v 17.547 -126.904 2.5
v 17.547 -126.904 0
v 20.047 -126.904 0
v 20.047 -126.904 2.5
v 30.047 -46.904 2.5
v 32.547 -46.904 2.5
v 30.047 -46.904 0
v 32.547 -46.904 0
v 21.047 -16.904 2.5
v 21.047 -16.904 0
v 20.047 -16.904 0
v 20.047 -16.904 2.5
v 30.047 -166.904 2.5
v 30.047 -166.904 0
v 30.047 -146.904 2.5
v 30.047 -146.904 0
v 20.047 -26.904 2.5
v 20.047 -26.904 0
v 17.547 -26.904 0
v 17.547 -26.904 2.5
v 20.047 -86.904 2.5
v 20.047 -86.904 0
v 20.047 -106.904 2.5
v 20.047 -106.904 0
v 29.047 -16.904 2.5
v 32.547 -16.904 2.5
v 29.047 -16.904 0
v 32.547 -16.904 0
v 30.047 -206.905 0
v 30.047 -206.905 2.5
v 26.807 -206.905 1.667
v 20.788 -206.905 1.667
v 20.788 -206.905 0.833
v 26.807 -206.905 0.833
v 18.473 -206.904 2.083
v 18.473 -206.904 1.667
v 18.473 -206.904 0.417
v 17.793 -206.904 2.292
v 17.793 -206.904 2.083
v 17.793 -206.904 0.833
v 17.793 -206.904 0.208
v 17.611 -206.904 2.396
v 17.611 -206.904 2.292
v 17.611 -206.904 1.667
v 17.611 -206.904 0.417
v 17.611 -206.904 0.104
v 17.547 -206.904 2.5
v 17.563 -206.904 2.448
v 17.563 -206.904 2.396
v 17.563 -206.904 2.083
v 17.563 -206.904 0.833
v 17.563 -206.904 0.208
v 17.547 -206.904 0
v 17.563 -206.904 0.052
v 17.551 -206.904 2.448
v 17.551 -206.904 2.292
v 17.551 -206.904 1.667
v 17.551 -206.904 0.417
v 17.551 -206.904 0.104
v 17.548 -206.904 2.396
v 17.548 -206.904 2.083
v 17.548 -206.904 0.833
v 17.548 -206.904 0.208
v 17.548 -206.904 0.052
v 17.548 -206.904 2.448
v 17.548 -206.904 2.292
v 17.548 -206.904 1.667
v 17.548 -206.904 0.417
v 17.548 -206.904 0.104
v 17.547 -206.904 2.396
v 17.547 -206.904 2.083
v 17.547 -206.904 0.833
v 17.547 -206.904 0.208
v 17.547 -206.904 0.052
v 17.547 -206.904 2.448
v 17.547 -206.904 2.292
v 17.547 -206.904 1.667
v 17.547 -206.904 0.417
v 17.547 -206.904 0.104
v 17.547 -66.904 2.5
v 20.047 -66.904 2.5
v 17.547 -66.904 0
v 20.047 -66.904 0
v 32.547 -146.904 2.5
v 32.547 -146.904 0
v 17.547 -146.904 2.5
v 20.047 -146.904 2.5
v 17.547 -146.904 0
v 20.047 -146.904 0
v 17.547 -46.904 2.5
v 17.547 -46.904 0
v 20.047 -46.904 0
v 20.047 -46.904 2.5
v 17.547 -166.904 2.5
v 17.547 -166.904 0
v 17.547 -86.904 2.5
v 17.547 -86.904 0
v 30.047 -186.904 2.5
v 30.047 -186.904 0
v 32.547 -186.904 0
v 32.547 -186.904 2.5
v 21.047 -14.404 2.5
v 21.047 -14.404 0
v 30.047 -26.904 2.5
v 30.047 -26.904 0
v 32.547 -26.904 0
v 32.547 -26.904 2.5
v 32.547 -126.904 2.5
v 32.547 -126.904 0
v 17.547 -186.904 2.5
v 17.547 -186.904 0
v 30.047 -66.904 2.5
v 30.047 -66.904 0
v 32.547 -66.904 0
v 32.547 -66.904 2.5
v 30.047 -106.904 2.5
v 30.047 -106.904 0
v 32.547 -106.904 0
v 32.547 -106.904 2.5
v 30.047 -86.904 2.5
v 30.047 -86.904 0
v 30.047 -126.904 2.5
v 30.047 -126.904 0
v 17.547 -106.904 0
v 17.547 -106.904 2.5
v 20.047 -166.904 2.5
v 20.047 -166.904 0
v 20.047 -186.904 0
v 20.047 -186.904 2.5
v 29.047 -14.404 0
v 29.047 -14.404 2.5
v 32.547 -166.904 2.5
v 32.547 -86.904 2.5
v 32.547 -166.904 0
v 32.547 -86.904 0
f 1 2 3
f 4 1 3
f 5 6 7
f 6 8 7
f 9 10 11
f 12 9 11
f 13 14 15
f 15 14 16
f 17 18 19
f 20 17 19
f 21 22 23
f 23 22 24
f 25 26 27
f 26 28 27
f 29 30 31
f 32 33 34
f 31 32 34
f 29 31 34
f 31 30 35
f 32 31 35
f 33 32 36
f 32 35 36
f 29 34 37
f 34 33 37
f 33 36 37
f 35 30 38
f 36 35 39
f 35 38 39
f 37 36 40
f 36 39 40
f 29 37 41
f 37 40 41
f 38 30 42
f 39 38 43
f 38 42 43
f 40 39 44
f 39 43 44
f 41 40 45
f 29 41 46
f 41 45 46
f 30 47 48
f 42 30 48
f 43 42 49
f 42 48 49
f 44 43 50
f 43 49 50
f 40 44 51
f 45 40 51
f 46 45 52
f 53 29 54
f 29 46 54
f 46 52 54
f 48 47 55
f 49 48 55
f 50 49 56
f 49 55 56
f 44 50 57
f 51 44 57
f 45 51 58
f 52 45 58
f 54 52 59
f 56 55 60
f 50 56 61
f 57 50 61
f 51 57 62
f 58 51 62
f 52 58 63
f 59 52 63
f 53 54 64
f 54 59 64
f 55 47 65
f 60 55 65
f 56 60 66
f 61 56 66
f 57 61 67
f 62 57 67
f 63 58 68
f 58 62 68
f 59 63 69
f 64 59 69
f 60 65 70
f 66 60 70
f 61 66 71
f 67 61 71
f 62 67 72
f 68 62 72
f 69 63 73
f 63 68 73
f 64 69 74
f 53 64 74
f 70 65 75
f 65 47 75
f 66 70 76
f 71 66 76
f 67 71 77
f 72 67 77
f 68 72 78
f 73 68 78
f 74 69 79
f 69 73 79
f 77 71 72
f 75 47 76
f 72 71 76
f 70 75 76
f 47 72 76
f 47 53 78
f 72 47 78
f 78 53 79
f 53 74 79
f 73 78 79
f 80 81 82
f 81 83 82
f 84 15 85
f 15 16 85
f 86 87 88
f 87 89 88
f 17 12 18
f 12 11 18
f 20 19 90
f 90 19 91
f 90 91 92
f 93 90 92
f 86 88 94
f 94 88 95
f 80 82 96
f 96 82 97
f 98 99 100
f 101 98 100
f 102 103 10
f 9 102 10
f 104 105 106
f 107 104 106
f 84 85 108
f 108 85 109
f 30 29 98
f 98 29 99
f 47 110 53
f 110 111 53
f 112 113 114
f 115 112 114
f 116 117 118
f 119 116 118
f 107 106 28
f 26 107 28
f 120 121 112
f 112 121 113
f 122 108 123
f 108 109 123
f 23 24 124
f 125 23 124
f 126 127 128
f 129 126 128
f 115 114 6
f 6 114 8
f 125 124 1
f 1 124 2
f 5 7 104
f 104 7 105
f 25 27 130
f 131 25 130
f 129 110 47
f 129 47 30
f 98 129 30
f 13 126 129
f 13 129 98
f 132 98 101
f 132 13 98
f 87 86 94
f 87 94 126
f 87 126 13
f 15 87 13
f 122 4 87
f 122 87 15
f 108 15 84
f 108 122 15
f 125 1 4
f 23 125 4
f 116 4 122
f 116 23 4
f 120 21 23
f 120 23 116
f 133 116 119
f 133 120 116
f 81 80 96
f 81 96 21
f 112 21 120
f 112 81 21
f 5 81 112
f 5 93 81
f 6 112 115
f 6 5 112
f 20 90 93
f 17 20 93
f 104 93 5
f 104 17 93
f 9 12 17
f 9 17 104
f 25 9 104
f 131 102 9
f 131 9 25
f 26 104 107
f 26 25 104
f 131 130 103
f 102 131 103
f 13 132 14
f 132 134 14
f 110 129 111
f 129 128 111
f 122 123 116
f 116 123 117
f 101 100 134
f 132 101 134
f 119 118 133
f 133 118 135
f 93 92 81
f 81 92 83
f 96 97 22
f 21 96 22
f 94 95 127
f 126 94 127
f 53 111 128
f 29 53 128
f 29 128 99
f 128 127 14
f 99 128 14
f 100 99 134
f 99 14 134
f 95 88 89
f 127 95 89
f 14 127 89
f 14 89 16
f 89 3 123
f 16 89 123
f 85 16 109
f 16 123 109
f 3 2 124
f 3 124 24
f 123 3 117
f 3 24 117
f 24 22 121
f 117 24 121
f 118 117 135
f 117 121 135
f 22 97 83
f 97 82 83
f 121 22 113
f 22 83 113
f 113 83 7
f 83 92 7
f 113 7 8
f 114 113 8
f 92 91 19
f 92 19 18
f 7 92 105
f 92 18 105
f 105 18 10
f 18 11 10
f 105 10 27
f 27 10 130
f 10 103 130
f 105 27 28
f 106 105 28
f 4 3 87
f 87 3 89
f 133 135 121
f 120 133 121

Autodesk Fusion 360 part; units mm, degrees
sketch "スケッチ1" plane through (0, 0, 0) normal (0, 0, 1) x (1, 0, 0)
  line L0 (20.0472, -16.9044) -> (20.0472, -26.9043)
  line L1 (20.0472, -26.9043) -> (17.5473, -26.9043)
  line L2 (17.5473, -26.9043) -> (17.5473, -46.9043)
  line L3 (17.5473, -46.9043) -> (20.0472, -46.9043)
  line L4 (20.0472, -46.9043) -> (20.0472, -66.9043)
  line L5 (20.0472, -66.9043) -> (17.5473, -66.9043)
  line L6 (17.5473, -66.9043) -> (17.5473, -86.9043)
  line L7 (17.5473, -86.9043) -> (20.0472, -86.9043)
  line L8 (20.0472, -86.9043) -> (20.0472, -106.9043)
  line L9 (20.0472, -106.9043) -> (17.5473, -106.9043)
  line L10 (17.5473, -106.9043) -> (17.5473, -126.9043)
  line L11 (17.5473, -126.9043) -> (20.0472, -126.9043)
  line L12 (20.0472, -126.9043) -> (20.0472, -146.9043)
  line L13 (20.0472, -146.9043) -> (17.5473, -146.9043)
  line L14 (17.5473, -146.9043) -> (17.5473, -166.9043)
  line L15 (17.5473, -166.9043) -> (20.0472, -166.9043)
  line L16 (20.0472, -166.9043) -> (20.0472, -186.9045)
  line L17 (20.0472, -186.9045) -> (17.5473, -186.9045)
  line L18 (17.5473, -186.9045) -> (17.5473, -206.9043)
  spline S0 degree 3 poles (17.5473, -206.9043) (17.5473, -206.9046) (30.0472, -206.9046) (30.0473, -206.9046) knots 19 19 19 19 20 20 20 20
  line L19 (30.0473, -206.9046) -> (30.0473, -186.9045)
  line L20 (30.0473, -186.9045) -> (32.5472, -186.9045)
  line L21 (32.5472, -186.9045) -> (32.5472, -166.9043)
  line L22 (32.5472, -166.9043) -> (30.0473, -166.9043)
  line L23 (30.0473, -166.9043) -> (30.0473, -146.9043)
  line L24 (30.0473, -146.9043) -> (32.5472, -146.9043)
  line L25 (32.5472, -146.9043) -> (32.5472, -126.9043)
  line L26 (32.5472, -126.9043) -> (30.0473, -126.9043)
  line L27 (30.0473, -126.9043) -> (30.0473, -106.9043)
  line L28 (30.0473, -106.9043) -> (32.5472, -106.9043)
  line L29 (32.5472, -106.9043) -> (32.5472, -86.9043)
  line L30 (32.5472, -86.9043) -> (30.0473, -86.9043)
  line L31 (30.0473, -86.9043) -> (30.0473, -66.9043)
  line L32 (30.0473, -66.9043) -> (32.5472, -66.9043)
  line L33 (32.5472, -66.9043) -> (32.5472, -46.9043)
  line L34 (32.5472, -46.9043) -> (30.0473, -46.9043)
  line L35 (30.0473, -46.9043) -> (30.0473, -26.9043)
  line L36 (30.0473, -26.9043) -> (32.5472, -26.9043)
  line L37 (32.5472, -26.9043) -> (32.5472, -16.9044)
  line L38 (32.5472, -16.9044) -> (29.0473, -16.9044)
  line L39 (29.0473, -16.9044) -> (29.0473, -14.4045)
  line L40 (29.0473, -14.4045) -> (21.0473, -14.4045)
  line L41 (21.0473, -14.4045) -> (21.0473, -16.9044)
  line L42 (21.0473, -16.9044) -> (20.0472, -16.9044)
extrude "押し出し1" add sketch "スケッチ1" along normal blind 2.5
